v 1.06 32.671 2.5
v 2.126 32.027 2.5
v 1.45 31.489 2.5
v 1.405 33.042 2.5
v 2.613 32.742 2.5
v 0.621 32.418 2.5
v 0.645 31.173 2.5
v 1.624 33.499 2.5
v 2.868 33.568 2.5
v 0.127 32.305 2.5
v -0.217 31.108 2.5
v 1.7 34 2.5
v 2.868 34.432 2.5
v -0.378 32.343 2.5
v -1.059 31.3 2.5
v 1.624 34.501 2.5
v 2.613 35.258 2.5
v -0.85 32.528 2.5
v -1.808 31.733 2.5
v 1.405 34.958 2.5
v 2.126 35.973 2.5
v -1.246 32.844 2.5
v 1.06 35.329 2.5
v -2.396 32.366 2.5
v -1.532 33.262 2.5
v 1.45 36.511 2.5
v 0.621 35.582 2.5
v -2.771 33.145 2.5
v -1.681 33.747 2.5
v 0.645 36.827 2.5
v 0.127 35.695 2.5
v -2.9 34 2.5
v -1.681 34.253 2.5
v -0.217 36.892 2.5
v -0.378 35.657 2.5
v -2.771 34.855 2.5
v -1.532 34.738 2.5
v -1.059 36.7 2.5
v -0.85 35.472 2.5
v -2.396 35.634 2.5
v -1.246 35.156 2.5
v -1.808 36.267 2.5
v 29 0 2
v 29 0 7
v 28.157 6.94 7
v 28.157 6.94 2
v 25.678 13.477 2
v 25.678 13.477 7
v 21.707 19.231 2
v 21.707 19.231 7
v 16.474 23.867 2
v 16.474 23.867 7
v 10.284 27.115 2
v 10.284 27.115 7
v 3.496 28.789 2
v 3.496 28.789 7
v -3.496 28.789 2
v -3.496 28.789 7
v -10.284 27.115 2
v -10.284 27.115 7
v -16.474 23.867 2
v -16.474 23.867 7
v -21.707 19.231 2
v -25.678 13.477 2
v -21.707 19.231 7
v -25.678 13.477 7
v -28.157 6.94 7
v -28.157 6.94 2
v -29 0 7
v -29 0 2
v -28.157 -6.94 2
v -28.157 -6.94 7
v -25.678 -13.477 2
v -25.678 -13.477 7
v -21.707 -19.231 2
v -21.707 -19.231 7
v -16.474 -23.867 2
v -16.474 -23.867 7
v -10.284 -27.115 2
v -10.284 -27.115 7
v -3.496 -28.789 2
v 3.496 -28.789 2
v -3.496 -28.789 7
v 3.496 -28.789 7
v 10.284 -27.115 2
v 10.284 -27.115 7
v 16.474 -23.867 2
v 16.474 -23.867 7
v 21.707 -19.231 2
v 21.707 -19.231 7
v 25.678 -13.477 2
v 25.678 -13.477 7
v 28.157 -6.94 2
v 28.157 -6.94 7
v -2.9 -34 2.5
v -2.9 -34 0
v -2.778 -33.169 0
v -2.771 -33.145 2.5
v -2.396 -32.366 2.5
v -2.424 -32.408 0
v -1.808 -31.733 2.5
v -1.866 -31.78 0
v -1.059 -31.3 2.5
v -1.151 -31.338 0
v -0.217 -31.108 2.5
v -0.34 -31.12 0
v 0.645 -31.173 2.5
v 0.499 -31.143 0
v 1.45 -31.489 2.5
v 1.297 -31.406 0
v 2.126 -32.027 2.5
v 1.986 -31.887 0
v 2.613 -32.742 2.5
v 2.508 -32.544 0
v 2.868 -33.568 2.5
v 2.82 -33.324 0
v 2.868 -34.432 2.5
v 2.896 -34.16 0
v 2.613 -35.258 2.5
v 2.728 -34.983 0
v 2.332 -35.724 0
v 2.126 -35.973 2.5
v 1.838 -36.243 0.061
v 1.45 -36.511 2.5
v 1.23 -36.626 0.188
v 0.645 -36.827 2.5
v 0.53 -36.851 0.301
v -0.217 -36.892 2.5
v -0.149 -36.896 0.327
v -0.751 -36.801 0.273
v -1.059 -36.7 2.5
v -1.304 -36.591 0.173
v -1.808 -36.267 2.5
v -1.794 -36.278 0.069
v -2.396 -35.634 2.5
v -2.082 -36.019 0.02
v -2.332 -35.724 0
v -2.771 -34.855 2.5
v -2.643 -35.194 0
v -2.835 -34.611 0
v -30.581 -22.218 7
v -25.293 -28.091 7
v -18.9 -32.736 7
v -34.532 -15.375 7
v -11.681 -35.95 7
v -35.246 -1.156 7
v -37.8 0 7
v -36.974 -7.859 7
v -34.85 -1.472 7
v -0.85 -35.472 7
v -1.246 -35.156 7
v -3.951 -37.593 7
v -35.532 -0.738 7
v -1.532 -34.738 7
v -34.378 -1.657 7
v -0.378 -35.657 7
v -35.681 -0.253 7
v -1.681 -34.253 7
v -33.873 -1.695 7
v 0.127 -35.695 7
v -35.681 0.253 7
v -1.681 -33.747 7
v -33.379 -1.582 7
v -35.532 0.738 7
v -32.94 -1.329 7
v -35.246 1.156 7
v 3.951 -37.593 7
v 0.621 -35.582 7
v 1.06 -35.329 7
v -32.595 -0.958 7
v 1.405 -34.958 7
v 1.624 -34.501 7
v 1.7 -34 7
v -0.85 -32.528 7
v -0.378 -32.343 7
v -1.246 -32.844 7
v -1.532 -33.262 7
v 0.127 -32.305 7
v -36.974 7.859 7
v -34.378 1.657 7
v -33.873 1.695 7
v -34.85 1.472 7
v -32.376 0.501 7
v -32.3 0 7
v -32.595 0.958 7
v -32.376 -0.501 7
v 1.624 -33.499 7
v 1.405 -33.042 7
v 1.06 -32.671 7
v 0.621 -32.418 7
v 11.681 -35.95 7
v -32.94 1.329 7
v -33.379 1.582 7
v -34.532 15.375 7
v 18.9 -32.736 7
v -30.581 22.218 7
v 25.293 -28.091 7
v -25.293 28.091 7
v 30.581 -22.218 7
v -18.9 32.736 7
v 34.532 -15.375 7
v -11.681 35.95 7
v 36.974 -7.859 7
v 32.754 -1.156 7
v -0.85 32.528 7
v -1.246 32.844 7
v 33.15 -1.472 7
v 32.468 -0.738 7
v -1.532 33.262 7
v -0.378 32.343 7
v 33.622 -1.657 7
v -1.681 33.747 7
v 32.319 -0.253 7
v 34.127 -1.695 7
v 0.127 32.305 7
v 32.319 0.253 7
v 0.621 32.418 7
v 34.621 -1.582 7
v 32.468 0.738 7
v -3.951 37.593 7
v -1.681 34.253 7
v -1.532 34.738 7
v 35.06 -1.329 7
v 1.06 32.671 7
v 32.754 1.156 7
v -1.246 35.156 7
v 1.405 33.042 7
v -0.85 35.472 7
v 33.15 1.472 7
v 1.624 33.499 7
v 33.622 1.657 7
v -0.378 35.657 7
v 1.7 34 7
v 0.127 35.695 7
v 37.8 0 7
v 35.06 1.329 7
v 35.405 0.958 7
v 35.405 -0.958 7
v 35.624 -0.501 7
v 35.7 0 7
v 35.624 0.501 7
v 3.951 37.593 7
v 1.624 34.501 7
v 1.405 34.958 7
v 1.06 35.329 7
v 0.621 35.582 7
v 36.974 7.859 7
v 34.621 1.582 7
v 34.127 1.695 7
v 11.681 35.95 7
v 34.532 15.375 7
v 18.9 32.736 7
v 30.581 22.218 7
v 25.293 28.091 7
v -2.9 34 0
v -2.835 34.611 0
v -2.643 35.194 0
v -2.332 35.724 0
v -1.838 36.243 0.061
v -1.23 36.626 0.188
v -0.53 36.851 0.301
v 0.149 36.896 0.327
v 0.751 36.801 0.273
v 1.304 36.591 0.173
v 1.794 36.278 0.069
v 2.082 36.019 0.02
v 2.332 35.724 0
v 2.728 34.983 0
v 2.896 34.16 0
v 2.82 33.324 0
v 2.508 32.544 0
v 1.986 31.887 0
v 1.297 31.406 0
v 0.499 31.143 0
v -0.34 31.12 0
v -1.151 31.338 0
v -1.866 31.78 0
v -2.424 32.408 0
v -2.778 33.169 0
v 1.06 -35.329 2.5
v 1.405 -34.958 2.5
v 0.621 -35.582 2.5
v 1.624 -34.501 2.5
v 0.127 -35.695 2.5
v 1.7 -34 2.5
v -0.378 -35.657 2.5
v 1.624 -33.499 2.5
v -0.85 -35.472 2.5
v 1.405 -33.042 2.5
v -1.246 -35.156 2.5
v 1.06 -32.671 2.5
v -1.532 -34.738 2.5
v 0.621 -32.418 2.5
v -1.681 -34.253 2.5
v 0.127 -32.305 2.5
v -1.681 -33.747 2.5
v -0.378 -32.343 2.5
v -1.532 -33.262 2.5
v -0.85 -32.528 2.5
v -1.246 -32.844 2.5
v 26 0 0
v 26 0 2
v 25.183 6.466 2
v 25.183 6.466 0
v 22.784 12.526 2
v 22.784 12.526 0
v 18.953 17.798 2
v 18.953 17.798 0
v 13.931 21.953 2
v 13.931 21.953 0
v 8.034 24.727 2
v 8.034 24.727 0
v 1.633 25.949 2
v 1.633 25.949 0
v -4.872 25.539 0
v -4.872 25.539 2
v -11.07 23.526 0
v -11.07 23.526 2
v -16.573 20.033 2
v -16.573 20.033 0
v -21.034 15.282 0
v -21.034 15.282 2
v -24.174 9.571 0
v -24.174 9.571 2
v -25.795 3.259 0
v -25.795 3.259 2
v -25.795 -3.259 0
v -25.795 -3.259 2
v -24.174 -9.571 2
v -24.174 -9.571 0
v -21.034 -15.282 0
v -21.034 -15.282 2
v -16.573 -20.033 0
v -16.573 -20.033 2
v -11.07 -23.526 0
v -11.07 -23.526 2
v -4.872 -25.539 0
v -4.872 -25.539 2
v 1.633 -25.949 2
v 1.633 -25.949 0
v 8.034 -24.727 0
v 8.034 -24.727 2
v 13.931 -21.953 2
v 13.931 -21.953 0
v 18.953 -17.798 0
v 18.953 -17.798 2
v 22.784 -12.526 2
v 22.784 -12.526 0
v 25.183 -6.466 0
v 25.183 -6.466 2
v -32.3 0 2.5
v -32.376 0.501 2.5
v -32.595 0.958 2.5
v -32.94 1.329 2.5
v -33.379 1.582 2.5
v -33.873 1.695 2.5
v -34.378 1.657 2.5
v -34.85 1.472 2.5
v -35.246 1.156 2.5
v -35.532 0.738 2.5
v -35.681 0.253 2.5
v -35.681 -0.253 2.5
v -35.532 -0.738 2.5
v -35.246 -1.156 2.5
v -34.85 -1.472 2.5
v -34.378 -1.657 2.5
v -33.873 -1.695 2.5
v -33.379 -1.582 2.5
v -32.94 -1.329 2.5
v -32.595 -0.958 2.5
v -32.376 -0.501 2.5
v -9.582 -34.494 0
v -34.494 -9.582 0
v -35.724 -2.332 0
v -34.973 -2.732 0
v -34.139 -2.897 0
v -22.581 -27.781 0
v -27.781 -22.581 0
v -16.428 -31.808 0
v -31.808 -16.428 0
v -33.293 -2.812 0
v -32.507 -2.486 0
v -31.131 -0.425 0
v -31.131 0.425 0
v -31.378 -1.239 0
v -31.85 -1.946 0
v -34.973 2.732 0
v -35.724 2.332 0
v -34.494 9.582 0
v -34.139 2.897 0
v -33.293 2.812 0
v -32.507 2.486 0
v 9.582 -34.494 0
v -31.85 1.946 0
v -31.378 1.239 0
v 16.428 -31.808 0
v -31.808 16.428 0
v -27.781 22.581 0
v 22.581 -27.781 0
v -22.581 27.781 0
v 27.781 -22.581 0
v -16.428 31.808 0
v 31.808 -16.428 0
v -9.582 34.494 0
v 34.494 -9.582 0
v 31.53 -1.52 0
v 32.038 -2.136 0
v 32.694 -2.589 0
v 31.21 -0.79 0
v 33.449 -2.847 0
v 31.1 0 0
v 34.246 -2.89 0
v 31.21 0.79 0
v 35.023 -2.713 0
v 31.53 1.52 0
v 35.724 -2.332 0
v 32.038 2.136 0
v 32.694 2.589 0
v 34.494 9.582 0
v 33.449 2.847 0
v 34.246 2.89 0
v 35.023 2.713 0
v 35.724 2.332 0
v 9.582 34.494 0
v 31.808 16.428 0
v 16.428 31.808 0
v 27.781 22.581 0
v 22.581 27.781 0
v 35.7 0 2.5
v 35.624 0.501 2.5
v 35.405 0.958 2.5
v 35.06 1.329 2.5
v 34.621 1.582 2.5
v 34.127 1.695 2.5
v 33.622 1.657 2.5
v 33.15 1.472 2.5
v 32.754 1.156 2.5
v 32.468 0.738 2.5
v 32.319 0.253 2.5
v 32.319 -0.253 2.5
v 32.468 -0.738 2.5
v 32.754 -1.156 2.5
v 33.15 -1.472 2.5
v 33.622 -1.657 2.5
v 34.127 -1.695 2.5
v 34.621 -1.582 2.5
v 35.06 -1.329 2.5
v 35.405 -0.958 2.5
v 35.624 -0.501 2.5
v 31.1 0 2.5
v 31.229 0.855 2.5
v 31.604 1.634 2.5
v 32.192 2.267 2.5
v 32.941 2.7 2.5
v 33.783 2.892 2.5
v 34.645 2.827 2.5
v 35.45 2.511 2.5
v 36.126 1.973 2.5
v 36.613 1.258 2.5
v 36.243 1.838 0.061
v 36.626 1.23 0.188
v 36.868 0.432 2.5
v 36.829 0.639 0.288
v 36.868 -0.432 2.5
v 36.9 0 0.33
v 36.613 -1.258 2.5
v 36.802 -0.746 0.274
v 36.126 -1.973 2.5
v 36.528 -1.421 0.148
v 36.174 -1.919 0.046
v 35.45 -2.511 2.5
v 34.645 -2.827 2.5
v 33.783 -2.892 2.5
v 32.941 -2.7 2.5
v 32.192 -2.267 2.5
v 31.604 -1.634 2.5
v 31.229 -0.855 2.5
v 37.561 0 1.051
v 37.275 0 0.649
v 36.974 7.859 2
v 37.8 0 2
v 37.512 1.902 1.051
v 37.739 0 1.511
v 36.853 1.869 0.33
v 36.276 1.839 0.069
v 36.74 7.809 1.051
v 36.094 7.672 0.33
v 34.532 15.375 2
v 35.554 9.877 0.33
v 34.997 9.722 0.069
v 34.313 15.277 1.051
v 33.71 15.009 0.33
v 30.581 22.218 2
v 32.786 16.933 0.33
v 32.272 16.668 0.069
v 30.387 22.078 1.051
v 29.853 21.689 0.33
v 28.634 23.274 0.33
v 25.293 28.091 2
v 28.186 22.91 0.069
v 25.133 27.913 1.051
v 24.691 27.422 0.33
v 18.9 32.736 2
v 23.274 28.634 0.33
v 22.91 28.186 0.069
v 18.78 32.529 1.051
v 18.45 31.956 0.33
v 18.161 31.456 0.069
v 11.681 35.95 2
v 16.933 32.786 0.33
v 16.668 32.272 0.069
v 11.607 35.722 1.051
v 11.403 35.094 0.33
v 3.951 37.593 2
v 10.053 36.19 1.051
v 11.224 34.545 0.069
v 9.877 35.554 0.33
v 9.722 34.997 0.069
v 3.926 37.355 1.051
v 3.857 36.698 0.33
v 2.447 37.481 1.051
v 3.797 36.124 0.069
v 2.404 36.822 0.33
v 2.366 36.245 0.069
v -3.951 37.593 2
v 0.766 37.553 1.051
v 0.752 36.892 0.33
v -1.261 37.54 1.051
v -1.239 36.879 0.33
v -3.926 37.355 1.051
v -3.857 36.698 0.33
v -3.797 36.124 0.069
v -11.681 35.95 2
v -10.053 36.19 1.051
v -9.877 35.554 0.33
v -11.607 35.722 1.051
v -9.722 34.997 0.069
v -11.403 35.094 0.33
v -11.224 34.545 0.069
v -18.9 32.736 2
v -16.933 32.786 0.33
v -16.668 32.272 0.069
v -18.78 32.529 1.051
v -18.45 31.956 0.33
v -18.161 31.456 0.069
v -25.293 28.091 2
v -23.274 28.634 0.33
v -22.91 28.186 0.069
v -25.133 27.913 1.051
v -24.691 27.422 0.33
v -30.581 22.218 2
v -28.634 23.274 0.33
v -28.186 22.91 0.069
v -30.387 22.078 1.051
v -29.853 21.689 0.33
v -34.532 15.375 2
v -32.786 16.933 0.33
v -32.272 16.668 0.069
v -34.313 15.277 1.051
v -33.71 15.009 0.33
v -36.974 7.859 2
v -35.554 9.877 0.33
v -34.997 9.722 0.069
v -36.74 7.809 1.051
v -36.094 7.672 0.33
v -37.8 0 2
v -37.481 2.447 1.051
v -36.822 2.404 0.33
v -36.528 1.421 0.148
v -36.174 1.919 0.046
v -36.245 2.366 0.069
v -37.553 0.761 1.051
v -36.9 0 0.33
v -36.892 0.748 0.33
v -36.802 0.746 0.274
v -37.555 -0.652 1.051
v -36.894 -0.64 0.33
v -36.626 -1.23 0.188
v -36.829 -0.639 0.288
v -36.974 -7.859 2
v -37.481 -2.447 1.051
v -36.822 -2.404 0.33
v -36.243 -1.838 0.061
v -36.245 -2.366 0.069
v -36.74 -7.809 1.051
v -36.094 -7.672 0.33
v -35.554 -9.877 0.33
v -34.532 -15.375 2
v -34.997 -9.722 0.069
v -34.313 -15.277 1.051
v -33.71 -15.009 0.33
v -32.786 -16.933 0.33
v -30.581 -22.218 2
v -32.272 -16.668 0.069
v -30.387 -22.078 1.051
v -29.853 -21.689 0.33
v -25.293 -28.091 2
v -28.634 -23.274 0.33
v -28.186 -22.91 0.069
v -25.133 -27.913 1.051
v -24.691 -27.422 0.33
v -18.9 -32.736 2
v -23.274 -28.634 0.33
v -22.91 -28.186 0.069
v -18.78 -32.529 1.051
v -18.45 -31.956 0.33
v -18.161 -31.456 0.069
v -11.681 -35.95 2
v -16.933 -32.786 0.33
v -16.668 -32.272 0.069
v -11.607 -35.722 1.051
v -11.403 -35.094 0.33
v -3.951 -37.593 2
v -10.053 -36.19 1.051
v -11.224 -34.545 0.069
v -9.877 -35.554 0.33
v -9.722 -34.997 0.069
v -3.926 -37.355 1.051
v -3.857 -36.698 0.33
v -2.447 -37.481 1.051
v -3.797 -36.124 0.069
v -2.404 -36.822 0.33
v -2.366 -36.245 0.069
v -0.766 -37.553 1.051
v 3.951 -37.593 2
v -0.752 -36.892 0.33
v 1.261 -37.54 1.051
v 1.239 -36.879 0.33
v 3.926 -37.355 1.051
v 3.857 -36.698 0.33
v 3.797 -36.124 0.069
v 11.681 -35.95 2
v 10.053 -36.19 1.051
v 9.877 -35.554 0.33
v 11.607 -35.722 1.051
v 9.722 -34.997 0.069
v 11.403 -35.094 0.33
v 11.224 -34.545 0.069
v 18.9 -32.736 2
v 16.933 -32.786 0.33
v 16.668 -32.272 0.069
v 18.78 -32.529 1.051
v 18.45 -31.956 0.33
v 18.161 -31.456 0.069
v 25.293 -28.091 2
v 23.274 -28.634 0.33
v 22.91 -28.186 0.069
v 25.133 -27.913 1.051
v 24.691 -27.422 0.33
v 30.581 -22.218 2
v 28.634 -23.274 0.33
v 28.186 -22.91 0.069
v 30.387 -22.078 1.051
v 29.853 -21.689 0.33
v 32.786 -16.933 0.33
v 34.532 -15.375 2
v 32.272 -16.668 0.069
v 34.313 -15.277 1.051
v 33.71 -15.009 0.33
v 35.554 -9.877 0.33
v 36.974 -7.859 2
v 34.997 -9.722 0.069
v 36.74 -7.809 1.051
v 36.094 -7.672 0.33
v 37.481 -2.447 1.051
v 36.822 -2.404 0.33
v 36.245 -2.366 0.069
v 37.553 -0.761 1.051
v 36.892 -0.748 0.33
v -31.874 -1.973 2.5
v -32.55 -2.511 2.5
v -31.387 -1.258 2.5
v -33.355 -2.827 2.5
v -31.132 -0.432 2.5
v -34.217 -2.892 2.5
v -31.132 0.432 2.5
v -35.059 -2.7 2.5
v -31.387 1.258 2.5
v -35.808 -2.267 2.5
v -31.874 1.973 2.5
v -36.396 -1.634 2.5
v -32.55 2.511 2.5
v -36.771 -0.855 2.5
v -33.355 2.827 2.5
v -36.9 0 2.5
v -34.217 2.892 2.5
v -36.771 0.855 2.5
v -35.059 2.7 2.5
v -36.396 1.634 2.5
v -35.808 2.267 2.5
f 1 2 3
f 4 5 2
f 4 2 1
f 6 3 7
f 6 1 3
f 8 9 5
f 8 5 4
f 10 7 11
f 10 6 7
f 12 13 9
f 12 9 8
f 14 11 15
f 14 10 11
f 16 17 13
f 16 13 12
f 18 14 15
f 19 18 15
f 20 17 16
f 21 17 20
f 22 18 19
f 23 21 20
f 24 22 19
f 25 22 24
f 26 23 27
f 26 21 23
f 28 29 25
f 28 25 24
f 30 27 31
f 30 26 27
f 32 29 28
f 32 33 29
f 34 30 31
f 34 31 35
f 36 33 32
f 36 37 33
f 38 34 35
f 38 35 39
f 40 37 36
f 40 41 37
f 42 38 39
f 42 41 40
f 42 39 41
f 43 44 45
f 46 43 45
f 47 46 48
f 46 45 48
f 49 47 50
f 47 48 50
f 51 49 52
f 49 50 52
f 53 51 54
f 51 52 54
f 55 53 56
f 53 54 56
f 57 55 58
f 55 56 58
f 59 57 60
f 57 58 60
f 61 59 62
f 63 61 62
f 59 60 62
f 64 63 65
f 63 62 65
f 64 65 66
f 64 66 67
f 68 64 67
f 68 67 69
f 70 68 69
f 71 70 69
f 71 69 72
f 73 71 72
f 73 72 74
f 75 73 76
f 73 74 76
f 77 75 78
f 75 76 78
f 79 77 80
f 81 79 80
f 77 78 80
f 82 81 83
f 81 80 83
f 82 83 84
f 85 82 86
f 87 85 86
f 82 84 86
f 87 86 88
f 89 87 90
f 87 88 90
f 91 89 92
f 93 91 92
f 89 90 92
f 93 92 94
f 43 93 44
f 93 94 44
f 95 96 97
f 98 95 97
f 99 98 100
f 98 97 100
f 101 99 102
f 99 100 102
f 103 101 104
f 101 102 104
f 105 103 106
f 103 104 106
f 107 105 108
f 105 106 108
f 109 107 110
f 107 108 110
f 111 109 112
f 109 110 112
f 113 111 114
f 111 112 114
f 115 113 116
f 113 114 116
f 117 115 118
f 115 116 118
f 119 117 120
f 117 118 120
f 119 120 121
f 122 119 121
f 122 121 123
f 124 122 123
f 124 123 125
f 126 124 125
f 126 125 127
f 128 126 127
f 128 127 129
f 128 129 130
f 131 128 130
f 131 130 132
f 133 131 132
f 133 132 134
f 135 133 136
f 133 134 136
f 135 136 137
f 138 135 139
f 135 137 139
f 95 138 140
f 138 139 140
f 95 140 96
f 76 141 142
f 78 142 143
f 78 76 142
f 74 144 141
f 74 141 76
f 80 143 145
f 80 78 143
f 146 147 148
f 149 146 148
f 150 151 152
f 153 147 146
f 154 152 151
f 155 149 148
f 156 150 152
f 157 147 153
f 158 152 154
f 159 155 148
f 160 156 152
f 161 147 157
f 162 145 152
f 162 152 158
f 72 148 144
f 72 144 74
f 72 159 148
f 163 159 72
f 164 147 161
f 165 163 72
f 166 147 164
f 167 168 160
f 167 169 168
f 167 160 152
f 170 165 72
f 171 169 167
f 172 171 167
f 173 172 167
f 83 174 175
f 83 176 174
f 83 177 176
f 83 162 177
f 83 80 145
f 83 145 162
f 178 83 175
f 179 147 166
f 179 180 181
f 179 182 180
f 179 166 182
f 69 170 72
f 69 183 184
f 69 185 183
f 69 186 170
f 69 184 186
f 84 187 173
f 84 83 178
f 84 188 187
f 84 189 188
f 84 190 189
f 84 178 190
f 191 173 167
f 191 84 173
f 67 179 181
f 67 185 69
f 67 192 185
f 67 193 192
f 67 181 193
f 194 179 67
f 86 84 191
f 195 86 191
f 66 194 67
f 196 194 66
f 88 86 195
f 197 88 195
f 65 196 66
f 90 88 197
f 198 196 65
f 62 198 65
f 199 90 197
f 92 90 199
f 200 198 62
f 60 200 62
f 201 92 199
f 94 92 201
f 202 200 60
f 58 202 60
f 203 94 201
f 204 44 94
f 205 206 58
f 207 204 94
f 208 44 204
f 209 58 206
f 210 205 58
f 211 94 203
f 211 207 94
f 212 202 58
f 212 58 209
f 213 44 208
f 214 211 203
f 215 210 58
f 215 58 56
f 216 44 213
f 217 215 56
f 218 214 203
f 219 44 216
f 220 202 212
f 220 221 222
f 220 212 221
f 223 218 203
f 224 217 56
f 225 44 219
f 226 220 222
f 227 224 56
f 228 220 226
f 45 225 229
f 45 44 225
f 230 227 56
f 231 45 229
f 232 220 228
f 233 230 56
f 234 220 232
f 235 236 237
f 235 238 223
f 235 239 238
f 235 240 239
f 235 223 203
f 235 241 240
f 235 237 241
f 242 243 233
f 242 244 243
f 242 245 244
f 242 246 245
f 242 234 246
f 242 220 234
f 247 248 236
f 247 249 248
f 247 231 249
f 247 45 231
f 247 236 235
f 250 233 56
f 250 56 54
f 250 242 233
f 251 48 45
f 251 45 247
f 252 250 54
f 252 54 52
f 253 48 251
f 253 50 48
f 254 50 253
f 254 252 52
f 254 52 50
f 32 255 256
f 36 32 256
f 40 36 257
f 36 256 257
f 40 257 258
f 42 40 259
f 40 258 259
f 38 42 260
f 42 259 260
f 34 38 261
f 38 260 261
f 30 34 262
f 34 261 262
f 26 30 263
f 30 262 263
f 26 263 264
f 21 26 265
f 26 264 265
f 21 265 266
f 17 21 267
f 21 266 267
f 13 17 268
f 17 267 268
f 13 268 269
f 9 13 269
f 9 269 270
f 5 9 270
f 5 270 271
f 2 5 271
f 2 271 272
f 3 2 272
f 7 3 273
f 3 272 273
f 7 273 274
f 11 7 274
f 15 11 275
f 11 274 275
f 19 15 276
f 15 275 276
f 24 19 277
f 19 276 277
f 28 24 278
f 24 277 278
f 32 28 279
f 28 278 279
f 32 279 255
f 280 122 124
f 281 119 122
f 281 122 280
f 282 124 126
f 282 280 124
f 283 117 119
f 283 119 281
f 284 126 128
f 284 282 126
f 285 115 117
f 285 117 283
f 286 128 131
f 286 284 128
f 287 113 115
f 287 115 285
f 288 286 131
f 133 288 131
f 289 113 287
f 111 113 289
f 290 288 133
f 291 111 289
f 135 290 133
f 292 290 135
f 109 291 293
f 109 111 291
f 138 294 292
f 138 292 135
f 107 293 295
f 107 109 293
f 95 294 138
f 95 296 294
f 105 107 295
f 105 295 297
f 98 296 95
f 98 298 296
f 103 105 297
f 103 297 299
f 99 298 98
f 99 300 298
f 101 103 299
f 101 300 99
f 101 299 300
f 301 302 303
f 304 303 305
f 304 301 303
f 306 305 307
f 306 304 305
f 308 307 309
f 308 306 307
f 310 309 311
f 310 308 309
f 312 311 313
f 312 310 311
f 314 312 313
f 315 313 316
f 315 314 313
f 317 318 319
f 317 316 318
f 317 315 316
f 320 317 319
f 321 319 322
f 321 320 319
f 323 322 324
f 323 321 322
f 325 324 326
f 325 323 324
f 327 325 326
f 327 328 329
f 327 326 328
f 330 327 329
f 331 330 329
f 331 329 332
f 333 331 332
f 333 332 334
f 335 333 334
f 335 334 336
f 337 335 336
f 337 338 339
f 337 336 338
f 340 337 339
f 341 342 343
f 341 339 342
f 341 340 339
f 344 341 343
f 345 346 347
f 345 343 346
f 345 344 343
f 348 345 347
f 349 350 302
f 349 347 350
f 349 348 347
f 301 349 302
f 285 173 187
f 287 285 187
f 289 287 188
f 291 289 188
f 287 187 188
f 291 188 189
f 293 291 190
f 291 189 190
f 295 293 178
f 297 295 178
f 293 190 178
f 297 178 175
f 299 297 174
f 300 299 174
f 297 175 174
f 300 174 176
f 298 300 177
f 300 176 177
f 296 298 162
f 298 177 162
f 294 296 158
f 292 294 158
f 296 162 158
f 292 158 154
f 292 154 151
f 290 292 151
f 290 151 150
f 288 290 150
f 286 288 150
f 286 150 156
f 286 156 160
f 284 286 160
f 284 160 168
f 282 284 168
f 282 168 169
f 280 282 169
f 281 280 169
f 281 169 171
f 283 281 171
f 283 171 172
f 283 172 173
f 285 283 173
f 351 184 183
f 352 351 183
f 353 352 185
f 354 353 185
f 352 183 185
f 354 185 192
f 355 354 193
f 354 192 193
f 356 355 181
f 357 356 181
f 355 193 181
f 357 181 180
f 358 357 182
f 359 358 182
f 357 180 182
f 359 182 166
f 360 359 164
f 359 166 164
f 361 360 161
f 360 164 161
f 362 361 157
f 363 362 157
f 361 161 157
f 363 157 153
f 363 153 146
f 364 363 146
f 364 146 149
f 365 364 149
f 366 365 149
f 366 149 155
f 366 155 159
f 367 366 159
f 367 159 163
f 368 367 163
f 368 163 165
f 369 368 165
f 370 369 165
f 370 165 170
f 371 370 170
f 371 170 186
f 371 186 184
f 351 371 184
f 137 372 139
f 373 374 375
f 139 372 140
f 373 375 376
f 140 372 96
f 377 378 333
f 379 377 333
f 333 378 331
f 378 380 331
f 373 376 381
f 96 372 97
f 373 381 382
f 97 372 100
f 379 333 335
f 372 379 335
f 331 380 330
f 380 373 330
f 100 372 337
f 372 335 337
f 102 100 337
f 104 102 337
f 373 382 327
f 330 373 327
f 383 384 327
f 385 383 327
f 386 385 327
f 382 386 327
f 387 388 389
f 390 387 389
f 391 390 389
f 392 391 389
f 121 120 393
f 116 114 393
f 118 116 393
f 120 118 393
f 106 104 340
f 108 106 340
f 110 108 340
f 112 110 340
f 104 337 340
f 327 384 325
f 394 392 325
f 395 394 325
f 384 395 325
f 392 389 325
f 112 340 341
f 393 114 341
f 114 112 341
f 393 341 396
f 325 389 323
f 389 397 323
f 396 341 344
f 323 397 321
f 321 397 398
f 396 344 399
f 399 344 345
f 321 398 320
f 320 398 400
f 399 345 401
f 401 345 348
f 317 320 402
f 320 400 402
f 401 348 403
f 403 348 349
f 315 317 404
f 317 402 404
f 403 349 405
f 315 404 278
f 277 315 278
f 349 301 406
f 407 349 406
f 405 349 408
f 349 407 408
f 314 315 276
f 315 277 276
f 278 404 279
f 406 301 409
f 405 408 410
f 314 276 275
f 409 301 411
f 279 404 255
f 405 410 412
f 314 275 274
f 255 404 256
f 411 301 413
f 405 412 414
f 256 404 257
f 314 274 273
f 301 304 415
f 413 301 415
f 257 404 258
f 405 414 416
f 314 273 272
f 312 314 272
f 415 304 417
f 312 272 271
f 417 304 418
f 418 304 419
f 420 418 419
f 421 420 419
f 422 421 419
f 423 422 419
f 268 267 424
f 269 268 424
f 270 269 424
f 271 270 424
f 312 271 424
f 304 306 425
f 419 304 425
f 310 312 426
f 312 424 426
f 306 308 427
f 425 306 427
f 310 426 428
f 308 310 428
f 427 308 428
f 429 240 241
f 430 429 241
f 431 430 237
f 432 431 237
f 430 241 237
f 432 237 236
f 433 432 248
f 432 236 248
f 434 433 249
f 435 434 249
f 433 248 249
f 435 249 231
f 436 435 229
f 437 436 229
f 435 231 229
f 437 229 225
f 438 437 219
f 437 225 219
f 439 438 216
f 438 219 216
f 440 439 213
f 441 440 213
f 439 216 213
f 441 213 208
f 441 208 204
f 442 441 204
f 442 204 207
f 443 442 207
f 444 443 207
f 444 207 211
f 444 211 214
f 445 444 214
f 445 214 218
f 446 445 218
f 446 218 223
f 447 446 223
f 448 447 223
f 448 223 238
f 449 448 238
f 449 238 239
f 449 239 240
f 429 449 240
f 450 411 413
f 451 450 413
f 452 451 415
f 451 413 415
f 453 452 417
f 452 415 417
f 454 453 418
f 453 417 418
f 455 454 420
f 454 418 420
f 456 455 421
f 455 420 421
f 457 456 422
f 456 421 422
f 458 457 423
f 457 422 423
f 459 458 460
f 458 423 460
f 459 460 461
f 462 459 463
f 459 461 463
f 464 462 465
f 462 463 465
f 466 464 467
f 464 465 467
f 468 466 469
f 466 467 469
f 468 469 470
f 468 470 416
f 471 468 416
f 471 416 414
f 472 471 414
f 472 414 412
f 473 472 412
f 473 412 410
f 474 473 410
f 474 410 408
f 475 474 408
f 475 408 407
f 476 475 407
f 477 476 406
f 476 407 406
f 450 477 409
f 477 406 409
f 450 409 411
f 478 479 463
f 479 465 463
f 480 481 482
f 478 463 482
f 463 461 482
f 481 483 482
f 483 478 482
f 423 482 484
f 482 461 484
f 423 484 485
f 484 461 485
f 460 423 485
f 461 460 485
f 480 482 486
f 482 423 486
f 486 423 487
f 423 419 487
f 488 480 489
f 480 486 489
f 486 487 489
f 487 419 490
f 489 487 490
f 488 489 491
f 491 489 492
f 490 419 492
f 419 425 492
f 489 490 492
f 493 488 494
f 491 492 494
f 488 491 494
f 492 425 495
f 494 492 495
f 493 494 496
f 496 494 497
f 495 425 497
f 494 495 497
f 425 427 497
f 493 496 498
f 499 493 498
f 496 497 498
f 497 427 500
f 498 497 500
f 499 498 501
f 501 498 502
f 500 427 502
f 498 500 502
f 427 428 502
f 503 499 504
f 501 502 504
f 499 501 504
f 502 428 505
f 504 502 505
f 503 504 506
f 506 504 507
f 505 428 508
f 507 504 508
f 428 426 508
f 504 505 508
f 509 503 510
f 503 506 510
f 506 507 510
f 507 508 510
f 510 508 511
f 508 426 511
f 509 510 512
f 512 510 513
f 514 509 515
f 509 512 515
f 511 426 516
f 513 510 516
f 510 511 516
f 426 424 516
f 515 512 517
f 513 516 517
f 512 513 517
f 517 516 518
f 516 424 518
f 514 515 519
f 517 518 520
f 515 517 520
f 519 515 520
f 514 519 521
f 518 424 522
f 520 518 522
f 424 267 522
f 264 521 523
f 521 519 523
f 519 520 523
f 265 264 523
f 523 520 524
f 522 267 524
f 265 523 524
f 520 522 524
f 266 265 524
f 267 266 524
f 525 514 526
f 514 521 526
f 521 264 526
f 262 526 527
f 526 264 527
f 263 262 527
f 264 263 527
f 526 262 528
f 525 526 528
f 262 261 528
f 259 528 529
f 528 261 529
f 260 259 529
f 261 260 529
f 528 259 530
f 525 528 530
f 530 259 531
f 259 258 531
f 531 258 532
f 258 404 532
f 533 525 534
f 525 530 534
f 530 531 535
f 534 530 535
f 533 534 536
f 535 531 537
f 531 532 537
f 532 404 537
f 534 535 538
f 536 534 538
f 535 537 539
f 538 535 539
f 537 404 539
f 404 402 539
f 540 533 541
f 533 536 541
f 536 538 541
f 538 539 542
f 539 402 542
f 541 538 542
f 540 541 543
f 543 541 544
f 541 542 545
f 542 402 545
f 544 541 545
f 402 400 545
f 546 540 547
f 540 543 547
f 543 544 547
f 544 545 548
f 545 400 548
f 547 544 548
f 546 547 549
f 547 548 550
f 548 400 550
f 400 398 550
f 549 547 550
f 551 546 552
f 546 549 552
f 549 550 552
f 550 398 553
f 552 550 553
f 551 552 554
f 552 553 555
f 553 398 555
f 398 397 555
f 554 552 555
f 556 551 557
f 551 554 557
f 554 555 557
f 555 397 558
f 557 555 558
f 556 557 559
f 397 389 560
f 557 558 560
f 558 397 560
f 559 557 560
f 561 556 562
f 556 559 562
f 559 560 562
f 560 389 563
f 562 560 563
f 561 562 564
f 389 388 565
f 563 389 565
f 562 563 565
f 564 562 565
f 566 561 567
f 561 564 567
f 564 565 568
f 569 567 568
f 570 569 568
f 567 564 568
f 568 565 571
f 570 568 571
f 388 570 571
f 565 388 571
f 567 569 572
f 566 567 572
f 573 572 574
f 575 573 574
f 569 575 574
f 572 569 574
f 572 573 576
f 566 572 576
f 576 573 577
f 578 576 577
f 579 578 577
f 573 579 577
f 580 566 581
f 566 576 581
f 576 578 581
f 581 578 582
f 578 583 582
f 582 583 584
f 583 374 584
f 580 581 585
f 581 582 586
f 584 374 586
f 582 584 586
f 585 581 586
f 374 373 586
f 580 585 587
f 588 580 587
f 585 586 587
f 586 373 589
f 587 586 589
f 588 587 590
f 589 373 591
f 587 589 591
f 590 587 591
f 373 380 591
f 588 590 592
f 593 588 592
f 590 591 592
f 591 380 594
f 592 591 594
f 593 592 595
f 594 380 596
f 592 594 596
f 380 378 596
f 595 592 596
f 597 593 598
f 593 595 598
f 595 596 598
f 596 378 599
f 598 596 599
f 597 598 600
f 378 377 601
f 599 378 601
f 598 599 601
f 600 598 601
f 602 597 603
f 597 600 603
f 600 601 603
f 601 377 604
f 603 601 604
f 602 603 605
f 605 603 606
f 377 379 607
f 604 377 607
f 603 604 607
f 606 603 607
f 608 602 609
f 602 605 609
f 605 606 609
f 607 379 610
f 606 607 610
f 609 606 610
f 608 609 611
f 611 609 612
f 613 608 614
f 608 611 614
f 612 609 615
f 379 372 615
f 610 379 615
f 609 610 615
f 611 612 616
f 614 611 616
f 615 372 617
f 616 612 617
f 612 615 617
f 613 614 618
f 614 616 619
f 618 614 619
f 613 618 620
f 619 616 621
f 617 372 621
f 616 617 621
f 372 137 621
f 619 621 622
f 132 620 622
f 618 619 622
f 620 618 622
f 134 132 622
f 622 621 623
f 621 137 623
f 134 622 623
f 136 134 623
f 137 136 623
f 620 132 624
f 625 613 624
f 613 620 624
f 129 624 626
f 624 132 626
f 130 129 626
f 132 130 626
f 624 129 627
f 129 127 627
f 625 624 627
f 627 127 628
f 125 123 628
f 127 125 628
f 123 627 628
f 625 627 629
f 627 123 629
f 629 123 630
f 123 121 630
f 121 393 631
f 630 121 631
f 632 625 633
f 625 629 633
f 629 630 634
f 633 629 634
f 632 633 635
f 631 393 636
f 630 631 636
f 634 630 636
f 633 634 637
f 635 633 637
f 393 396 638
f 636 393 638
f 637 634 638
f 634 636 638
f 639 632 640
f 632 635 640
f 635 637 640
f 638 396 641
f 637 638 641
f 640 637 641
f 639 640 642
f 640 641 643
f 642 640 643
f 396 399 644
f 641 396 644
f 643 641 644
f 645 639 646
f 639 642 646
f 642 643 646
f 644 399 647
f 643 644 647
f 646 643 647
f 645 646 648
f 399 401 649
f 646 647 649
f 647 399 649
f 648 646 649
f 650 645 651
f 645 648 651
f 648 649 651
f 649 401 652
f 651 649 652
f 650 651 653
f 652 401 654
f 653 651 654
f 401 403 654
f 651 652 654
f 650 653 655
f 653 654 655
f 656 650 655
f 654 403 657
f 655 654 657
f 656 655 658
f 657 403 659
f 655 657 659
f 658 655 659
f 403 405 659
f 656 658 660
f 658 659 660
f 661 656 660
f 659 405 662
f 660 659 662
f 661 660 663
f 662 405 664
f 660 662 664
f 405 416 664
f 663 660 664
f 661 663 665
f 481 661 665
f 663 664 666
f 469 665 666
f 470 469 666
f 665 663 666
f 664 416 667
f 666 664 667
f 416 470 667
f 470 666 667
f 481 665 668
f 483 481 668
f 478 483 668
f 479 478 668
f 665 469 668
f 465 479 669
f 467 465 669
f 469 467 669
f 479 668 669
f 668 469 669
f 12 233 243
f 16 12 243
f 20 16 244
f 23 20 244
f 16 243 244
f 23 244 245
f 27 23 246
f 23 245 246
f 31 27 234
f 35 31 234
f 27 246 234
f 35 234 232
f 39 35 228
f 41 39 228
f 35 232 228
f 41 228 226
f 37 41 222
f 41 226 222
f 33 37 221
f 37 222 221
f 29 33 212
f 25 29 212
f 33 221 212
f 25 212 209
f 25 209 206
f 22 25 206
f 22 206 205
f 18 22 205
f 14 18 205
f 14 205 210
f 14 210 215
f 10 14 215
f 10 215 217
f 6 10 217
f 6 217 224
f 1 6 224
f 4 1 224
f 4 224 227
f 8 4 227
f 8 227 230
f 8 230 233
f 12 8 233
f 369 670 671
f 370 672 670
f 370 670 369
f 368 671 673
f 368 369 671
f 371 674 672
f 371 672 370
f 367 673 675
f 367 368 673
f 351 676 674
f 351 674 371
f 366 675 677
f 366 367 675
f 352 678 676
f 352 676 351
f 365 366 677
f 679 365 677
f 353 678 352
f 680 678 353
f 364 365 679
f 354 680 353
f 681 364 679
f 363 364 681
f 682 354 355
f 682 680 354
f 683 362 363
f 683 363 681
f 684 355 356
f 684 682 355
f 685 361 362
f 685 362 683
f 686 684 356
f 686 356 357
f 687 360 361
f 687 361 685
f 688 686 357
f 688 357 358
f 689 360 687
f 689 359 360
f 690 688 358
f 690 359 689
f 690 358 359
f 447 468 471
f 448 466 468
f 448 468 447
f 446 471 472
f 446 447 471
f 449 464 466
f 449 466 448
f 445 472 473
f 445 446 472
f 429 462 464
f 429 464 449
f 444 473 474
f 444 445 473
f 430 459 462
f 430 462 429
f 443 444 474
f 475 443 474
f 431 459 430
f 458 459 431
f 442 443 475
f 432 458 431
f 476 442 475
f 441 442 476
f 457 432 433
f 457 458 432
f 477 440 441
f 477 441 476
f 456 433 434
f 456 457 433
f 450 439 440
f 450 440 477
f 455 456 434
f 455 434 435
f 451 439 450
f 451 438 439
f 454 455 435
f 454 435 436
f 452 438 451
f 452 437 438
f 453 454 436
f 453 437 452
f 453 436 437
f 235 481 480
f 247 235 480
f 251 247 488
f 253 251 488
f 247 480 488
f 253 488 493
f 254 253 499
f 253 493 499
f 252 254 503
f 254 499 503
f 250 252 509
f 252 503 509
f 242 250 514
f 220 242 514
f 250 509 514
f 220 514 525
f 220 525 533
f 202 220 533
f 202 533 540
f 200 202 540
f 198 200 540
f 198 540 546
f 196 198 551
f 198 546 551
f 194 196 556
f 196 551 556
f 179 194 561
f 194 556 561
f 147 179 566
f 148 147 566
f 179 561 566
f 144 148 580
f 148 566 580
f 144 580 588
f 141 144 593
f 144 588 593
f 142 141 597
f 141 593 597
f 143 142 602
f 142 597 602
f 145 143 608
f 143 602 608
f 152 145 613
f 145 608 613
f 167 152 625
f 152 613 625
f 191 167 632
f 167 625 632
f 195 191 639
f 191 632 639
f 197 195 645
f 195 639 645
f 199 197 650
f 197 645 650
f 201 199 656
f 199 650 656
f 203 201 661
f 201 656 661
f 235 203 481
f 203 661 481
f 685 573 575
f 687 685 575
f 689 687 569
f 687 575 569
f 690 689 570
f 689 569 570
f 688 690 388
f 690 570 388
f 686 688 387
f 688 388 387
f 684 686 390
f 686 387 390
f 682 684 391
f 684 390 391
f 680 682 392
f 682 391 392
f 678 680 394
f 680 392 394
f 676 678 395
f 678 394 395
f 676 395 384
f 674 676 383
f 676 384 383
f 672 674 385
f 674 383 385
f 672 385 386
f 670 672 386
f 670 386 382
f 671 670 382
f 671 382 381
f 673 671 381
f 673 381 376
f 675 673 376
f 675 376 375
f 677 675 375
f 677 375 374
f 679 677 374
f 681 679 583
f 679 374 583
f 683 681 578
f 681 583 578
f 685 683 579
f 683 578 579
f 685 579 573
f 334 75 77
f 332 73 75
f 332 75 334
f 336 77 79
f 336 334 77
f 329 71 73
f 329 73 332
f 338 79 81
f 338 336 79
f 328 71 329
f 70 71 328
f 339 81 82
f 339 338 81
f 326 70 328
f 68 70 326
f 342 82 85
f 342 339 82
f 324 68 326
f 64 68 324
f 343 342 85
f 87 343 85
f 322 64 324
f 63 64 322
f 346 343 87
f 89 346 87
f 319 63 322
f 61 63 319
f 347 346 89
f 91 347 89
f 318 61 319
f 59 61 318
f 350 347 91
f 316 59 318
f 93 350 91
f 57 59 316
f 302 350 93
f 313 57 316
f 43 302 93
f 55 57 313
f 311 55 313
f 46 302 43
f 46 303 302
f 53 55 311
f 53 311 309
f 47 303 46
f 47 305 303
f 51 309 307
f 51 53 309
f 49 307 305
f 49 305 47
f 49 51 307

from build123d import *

# Parameters (mm, degrees)
SKETCH_1_R          = 37.8
SKETCH_1_R_2        = 26
EXTRUDE_1_DEPTH     = 7
SKETCH_2_R          = 29
CUT_EXTRUDE_1_DEPTH = 5
FILLET_1_R          = 2
SKETCH_3_R          = 1.7
CUT_EXTRUDE_2_DEPTH = 8
SKETCH_4_R          = 2.9
CUT_EXTRUDE_3_DEPTH = 2.5


with BuildPart() as part:
    # 草图1 → 凸台-拉伸1 (new body)
    with BuildSketch(Plane.XY):
        Circle(SKETCH_1_R)
        Circle(SKETCH_1_R_2, mode=Mode.SUBTRACT)
    extrude(amount=EXTRUDE_1_DEPTH)

    # 草图2 → 切除-拉伸1 (cut)
    with BuildSketch(Plane.XY.offset(7)):
        Circle(SKETCH_2_R)
    extrude(amount=-CUT_EXTRUDE_1_DEPTH, mode=Mode.SUBTRACT)

    # 圆角1
    fillet_1_edges = [part.edges().sort_by_distance(p)[0] for p in [
        (-37.8, 0, 0),
    ]]
    fillet(fillet_1_edges, radius=FILLET_1_R)

    # 草图3 → 切除-拉伸2 (cut)
    with BuildSketch(Plane.XY.offset(7)):
        with Locations((0, -34)):
            Circle(SKETCH_3_R)
        with Locations((-34, 0)):
            Circle(SKETCH_3_R)
        with Locations((0, 34)):
            Circle(SKETCH_3_R)
        with Locations((34, 0)):
            Circle(SKETCH_3_R)
    extrude(amount=-CUT_EXTRUDE_2_DEPTH, mode=Mode.SUBTRACT)

    # 草图4 → 切除-拉伸3 (cut)
    with BuildSketch(Plane(origin=(0, 0, 0), x_dir=(-1, 0, 0), z_dir=(0, 0, -1))):
        with Locations((-34, 0)):
            Circle(SKETCH_4_R)
        with Locations((0, 34)):
            Circle(SKETCH_4_R)
        with Locations((34, 0)):
            Circle(SKETCH_4_R)
        with Locations((0, -34)):
            Circle(SKETCH_4_R)
    extrude(amount=-CUT_EXTRUDE_3_DEPTH, mode=Mode.SUBTRACT)


solid = part.part
